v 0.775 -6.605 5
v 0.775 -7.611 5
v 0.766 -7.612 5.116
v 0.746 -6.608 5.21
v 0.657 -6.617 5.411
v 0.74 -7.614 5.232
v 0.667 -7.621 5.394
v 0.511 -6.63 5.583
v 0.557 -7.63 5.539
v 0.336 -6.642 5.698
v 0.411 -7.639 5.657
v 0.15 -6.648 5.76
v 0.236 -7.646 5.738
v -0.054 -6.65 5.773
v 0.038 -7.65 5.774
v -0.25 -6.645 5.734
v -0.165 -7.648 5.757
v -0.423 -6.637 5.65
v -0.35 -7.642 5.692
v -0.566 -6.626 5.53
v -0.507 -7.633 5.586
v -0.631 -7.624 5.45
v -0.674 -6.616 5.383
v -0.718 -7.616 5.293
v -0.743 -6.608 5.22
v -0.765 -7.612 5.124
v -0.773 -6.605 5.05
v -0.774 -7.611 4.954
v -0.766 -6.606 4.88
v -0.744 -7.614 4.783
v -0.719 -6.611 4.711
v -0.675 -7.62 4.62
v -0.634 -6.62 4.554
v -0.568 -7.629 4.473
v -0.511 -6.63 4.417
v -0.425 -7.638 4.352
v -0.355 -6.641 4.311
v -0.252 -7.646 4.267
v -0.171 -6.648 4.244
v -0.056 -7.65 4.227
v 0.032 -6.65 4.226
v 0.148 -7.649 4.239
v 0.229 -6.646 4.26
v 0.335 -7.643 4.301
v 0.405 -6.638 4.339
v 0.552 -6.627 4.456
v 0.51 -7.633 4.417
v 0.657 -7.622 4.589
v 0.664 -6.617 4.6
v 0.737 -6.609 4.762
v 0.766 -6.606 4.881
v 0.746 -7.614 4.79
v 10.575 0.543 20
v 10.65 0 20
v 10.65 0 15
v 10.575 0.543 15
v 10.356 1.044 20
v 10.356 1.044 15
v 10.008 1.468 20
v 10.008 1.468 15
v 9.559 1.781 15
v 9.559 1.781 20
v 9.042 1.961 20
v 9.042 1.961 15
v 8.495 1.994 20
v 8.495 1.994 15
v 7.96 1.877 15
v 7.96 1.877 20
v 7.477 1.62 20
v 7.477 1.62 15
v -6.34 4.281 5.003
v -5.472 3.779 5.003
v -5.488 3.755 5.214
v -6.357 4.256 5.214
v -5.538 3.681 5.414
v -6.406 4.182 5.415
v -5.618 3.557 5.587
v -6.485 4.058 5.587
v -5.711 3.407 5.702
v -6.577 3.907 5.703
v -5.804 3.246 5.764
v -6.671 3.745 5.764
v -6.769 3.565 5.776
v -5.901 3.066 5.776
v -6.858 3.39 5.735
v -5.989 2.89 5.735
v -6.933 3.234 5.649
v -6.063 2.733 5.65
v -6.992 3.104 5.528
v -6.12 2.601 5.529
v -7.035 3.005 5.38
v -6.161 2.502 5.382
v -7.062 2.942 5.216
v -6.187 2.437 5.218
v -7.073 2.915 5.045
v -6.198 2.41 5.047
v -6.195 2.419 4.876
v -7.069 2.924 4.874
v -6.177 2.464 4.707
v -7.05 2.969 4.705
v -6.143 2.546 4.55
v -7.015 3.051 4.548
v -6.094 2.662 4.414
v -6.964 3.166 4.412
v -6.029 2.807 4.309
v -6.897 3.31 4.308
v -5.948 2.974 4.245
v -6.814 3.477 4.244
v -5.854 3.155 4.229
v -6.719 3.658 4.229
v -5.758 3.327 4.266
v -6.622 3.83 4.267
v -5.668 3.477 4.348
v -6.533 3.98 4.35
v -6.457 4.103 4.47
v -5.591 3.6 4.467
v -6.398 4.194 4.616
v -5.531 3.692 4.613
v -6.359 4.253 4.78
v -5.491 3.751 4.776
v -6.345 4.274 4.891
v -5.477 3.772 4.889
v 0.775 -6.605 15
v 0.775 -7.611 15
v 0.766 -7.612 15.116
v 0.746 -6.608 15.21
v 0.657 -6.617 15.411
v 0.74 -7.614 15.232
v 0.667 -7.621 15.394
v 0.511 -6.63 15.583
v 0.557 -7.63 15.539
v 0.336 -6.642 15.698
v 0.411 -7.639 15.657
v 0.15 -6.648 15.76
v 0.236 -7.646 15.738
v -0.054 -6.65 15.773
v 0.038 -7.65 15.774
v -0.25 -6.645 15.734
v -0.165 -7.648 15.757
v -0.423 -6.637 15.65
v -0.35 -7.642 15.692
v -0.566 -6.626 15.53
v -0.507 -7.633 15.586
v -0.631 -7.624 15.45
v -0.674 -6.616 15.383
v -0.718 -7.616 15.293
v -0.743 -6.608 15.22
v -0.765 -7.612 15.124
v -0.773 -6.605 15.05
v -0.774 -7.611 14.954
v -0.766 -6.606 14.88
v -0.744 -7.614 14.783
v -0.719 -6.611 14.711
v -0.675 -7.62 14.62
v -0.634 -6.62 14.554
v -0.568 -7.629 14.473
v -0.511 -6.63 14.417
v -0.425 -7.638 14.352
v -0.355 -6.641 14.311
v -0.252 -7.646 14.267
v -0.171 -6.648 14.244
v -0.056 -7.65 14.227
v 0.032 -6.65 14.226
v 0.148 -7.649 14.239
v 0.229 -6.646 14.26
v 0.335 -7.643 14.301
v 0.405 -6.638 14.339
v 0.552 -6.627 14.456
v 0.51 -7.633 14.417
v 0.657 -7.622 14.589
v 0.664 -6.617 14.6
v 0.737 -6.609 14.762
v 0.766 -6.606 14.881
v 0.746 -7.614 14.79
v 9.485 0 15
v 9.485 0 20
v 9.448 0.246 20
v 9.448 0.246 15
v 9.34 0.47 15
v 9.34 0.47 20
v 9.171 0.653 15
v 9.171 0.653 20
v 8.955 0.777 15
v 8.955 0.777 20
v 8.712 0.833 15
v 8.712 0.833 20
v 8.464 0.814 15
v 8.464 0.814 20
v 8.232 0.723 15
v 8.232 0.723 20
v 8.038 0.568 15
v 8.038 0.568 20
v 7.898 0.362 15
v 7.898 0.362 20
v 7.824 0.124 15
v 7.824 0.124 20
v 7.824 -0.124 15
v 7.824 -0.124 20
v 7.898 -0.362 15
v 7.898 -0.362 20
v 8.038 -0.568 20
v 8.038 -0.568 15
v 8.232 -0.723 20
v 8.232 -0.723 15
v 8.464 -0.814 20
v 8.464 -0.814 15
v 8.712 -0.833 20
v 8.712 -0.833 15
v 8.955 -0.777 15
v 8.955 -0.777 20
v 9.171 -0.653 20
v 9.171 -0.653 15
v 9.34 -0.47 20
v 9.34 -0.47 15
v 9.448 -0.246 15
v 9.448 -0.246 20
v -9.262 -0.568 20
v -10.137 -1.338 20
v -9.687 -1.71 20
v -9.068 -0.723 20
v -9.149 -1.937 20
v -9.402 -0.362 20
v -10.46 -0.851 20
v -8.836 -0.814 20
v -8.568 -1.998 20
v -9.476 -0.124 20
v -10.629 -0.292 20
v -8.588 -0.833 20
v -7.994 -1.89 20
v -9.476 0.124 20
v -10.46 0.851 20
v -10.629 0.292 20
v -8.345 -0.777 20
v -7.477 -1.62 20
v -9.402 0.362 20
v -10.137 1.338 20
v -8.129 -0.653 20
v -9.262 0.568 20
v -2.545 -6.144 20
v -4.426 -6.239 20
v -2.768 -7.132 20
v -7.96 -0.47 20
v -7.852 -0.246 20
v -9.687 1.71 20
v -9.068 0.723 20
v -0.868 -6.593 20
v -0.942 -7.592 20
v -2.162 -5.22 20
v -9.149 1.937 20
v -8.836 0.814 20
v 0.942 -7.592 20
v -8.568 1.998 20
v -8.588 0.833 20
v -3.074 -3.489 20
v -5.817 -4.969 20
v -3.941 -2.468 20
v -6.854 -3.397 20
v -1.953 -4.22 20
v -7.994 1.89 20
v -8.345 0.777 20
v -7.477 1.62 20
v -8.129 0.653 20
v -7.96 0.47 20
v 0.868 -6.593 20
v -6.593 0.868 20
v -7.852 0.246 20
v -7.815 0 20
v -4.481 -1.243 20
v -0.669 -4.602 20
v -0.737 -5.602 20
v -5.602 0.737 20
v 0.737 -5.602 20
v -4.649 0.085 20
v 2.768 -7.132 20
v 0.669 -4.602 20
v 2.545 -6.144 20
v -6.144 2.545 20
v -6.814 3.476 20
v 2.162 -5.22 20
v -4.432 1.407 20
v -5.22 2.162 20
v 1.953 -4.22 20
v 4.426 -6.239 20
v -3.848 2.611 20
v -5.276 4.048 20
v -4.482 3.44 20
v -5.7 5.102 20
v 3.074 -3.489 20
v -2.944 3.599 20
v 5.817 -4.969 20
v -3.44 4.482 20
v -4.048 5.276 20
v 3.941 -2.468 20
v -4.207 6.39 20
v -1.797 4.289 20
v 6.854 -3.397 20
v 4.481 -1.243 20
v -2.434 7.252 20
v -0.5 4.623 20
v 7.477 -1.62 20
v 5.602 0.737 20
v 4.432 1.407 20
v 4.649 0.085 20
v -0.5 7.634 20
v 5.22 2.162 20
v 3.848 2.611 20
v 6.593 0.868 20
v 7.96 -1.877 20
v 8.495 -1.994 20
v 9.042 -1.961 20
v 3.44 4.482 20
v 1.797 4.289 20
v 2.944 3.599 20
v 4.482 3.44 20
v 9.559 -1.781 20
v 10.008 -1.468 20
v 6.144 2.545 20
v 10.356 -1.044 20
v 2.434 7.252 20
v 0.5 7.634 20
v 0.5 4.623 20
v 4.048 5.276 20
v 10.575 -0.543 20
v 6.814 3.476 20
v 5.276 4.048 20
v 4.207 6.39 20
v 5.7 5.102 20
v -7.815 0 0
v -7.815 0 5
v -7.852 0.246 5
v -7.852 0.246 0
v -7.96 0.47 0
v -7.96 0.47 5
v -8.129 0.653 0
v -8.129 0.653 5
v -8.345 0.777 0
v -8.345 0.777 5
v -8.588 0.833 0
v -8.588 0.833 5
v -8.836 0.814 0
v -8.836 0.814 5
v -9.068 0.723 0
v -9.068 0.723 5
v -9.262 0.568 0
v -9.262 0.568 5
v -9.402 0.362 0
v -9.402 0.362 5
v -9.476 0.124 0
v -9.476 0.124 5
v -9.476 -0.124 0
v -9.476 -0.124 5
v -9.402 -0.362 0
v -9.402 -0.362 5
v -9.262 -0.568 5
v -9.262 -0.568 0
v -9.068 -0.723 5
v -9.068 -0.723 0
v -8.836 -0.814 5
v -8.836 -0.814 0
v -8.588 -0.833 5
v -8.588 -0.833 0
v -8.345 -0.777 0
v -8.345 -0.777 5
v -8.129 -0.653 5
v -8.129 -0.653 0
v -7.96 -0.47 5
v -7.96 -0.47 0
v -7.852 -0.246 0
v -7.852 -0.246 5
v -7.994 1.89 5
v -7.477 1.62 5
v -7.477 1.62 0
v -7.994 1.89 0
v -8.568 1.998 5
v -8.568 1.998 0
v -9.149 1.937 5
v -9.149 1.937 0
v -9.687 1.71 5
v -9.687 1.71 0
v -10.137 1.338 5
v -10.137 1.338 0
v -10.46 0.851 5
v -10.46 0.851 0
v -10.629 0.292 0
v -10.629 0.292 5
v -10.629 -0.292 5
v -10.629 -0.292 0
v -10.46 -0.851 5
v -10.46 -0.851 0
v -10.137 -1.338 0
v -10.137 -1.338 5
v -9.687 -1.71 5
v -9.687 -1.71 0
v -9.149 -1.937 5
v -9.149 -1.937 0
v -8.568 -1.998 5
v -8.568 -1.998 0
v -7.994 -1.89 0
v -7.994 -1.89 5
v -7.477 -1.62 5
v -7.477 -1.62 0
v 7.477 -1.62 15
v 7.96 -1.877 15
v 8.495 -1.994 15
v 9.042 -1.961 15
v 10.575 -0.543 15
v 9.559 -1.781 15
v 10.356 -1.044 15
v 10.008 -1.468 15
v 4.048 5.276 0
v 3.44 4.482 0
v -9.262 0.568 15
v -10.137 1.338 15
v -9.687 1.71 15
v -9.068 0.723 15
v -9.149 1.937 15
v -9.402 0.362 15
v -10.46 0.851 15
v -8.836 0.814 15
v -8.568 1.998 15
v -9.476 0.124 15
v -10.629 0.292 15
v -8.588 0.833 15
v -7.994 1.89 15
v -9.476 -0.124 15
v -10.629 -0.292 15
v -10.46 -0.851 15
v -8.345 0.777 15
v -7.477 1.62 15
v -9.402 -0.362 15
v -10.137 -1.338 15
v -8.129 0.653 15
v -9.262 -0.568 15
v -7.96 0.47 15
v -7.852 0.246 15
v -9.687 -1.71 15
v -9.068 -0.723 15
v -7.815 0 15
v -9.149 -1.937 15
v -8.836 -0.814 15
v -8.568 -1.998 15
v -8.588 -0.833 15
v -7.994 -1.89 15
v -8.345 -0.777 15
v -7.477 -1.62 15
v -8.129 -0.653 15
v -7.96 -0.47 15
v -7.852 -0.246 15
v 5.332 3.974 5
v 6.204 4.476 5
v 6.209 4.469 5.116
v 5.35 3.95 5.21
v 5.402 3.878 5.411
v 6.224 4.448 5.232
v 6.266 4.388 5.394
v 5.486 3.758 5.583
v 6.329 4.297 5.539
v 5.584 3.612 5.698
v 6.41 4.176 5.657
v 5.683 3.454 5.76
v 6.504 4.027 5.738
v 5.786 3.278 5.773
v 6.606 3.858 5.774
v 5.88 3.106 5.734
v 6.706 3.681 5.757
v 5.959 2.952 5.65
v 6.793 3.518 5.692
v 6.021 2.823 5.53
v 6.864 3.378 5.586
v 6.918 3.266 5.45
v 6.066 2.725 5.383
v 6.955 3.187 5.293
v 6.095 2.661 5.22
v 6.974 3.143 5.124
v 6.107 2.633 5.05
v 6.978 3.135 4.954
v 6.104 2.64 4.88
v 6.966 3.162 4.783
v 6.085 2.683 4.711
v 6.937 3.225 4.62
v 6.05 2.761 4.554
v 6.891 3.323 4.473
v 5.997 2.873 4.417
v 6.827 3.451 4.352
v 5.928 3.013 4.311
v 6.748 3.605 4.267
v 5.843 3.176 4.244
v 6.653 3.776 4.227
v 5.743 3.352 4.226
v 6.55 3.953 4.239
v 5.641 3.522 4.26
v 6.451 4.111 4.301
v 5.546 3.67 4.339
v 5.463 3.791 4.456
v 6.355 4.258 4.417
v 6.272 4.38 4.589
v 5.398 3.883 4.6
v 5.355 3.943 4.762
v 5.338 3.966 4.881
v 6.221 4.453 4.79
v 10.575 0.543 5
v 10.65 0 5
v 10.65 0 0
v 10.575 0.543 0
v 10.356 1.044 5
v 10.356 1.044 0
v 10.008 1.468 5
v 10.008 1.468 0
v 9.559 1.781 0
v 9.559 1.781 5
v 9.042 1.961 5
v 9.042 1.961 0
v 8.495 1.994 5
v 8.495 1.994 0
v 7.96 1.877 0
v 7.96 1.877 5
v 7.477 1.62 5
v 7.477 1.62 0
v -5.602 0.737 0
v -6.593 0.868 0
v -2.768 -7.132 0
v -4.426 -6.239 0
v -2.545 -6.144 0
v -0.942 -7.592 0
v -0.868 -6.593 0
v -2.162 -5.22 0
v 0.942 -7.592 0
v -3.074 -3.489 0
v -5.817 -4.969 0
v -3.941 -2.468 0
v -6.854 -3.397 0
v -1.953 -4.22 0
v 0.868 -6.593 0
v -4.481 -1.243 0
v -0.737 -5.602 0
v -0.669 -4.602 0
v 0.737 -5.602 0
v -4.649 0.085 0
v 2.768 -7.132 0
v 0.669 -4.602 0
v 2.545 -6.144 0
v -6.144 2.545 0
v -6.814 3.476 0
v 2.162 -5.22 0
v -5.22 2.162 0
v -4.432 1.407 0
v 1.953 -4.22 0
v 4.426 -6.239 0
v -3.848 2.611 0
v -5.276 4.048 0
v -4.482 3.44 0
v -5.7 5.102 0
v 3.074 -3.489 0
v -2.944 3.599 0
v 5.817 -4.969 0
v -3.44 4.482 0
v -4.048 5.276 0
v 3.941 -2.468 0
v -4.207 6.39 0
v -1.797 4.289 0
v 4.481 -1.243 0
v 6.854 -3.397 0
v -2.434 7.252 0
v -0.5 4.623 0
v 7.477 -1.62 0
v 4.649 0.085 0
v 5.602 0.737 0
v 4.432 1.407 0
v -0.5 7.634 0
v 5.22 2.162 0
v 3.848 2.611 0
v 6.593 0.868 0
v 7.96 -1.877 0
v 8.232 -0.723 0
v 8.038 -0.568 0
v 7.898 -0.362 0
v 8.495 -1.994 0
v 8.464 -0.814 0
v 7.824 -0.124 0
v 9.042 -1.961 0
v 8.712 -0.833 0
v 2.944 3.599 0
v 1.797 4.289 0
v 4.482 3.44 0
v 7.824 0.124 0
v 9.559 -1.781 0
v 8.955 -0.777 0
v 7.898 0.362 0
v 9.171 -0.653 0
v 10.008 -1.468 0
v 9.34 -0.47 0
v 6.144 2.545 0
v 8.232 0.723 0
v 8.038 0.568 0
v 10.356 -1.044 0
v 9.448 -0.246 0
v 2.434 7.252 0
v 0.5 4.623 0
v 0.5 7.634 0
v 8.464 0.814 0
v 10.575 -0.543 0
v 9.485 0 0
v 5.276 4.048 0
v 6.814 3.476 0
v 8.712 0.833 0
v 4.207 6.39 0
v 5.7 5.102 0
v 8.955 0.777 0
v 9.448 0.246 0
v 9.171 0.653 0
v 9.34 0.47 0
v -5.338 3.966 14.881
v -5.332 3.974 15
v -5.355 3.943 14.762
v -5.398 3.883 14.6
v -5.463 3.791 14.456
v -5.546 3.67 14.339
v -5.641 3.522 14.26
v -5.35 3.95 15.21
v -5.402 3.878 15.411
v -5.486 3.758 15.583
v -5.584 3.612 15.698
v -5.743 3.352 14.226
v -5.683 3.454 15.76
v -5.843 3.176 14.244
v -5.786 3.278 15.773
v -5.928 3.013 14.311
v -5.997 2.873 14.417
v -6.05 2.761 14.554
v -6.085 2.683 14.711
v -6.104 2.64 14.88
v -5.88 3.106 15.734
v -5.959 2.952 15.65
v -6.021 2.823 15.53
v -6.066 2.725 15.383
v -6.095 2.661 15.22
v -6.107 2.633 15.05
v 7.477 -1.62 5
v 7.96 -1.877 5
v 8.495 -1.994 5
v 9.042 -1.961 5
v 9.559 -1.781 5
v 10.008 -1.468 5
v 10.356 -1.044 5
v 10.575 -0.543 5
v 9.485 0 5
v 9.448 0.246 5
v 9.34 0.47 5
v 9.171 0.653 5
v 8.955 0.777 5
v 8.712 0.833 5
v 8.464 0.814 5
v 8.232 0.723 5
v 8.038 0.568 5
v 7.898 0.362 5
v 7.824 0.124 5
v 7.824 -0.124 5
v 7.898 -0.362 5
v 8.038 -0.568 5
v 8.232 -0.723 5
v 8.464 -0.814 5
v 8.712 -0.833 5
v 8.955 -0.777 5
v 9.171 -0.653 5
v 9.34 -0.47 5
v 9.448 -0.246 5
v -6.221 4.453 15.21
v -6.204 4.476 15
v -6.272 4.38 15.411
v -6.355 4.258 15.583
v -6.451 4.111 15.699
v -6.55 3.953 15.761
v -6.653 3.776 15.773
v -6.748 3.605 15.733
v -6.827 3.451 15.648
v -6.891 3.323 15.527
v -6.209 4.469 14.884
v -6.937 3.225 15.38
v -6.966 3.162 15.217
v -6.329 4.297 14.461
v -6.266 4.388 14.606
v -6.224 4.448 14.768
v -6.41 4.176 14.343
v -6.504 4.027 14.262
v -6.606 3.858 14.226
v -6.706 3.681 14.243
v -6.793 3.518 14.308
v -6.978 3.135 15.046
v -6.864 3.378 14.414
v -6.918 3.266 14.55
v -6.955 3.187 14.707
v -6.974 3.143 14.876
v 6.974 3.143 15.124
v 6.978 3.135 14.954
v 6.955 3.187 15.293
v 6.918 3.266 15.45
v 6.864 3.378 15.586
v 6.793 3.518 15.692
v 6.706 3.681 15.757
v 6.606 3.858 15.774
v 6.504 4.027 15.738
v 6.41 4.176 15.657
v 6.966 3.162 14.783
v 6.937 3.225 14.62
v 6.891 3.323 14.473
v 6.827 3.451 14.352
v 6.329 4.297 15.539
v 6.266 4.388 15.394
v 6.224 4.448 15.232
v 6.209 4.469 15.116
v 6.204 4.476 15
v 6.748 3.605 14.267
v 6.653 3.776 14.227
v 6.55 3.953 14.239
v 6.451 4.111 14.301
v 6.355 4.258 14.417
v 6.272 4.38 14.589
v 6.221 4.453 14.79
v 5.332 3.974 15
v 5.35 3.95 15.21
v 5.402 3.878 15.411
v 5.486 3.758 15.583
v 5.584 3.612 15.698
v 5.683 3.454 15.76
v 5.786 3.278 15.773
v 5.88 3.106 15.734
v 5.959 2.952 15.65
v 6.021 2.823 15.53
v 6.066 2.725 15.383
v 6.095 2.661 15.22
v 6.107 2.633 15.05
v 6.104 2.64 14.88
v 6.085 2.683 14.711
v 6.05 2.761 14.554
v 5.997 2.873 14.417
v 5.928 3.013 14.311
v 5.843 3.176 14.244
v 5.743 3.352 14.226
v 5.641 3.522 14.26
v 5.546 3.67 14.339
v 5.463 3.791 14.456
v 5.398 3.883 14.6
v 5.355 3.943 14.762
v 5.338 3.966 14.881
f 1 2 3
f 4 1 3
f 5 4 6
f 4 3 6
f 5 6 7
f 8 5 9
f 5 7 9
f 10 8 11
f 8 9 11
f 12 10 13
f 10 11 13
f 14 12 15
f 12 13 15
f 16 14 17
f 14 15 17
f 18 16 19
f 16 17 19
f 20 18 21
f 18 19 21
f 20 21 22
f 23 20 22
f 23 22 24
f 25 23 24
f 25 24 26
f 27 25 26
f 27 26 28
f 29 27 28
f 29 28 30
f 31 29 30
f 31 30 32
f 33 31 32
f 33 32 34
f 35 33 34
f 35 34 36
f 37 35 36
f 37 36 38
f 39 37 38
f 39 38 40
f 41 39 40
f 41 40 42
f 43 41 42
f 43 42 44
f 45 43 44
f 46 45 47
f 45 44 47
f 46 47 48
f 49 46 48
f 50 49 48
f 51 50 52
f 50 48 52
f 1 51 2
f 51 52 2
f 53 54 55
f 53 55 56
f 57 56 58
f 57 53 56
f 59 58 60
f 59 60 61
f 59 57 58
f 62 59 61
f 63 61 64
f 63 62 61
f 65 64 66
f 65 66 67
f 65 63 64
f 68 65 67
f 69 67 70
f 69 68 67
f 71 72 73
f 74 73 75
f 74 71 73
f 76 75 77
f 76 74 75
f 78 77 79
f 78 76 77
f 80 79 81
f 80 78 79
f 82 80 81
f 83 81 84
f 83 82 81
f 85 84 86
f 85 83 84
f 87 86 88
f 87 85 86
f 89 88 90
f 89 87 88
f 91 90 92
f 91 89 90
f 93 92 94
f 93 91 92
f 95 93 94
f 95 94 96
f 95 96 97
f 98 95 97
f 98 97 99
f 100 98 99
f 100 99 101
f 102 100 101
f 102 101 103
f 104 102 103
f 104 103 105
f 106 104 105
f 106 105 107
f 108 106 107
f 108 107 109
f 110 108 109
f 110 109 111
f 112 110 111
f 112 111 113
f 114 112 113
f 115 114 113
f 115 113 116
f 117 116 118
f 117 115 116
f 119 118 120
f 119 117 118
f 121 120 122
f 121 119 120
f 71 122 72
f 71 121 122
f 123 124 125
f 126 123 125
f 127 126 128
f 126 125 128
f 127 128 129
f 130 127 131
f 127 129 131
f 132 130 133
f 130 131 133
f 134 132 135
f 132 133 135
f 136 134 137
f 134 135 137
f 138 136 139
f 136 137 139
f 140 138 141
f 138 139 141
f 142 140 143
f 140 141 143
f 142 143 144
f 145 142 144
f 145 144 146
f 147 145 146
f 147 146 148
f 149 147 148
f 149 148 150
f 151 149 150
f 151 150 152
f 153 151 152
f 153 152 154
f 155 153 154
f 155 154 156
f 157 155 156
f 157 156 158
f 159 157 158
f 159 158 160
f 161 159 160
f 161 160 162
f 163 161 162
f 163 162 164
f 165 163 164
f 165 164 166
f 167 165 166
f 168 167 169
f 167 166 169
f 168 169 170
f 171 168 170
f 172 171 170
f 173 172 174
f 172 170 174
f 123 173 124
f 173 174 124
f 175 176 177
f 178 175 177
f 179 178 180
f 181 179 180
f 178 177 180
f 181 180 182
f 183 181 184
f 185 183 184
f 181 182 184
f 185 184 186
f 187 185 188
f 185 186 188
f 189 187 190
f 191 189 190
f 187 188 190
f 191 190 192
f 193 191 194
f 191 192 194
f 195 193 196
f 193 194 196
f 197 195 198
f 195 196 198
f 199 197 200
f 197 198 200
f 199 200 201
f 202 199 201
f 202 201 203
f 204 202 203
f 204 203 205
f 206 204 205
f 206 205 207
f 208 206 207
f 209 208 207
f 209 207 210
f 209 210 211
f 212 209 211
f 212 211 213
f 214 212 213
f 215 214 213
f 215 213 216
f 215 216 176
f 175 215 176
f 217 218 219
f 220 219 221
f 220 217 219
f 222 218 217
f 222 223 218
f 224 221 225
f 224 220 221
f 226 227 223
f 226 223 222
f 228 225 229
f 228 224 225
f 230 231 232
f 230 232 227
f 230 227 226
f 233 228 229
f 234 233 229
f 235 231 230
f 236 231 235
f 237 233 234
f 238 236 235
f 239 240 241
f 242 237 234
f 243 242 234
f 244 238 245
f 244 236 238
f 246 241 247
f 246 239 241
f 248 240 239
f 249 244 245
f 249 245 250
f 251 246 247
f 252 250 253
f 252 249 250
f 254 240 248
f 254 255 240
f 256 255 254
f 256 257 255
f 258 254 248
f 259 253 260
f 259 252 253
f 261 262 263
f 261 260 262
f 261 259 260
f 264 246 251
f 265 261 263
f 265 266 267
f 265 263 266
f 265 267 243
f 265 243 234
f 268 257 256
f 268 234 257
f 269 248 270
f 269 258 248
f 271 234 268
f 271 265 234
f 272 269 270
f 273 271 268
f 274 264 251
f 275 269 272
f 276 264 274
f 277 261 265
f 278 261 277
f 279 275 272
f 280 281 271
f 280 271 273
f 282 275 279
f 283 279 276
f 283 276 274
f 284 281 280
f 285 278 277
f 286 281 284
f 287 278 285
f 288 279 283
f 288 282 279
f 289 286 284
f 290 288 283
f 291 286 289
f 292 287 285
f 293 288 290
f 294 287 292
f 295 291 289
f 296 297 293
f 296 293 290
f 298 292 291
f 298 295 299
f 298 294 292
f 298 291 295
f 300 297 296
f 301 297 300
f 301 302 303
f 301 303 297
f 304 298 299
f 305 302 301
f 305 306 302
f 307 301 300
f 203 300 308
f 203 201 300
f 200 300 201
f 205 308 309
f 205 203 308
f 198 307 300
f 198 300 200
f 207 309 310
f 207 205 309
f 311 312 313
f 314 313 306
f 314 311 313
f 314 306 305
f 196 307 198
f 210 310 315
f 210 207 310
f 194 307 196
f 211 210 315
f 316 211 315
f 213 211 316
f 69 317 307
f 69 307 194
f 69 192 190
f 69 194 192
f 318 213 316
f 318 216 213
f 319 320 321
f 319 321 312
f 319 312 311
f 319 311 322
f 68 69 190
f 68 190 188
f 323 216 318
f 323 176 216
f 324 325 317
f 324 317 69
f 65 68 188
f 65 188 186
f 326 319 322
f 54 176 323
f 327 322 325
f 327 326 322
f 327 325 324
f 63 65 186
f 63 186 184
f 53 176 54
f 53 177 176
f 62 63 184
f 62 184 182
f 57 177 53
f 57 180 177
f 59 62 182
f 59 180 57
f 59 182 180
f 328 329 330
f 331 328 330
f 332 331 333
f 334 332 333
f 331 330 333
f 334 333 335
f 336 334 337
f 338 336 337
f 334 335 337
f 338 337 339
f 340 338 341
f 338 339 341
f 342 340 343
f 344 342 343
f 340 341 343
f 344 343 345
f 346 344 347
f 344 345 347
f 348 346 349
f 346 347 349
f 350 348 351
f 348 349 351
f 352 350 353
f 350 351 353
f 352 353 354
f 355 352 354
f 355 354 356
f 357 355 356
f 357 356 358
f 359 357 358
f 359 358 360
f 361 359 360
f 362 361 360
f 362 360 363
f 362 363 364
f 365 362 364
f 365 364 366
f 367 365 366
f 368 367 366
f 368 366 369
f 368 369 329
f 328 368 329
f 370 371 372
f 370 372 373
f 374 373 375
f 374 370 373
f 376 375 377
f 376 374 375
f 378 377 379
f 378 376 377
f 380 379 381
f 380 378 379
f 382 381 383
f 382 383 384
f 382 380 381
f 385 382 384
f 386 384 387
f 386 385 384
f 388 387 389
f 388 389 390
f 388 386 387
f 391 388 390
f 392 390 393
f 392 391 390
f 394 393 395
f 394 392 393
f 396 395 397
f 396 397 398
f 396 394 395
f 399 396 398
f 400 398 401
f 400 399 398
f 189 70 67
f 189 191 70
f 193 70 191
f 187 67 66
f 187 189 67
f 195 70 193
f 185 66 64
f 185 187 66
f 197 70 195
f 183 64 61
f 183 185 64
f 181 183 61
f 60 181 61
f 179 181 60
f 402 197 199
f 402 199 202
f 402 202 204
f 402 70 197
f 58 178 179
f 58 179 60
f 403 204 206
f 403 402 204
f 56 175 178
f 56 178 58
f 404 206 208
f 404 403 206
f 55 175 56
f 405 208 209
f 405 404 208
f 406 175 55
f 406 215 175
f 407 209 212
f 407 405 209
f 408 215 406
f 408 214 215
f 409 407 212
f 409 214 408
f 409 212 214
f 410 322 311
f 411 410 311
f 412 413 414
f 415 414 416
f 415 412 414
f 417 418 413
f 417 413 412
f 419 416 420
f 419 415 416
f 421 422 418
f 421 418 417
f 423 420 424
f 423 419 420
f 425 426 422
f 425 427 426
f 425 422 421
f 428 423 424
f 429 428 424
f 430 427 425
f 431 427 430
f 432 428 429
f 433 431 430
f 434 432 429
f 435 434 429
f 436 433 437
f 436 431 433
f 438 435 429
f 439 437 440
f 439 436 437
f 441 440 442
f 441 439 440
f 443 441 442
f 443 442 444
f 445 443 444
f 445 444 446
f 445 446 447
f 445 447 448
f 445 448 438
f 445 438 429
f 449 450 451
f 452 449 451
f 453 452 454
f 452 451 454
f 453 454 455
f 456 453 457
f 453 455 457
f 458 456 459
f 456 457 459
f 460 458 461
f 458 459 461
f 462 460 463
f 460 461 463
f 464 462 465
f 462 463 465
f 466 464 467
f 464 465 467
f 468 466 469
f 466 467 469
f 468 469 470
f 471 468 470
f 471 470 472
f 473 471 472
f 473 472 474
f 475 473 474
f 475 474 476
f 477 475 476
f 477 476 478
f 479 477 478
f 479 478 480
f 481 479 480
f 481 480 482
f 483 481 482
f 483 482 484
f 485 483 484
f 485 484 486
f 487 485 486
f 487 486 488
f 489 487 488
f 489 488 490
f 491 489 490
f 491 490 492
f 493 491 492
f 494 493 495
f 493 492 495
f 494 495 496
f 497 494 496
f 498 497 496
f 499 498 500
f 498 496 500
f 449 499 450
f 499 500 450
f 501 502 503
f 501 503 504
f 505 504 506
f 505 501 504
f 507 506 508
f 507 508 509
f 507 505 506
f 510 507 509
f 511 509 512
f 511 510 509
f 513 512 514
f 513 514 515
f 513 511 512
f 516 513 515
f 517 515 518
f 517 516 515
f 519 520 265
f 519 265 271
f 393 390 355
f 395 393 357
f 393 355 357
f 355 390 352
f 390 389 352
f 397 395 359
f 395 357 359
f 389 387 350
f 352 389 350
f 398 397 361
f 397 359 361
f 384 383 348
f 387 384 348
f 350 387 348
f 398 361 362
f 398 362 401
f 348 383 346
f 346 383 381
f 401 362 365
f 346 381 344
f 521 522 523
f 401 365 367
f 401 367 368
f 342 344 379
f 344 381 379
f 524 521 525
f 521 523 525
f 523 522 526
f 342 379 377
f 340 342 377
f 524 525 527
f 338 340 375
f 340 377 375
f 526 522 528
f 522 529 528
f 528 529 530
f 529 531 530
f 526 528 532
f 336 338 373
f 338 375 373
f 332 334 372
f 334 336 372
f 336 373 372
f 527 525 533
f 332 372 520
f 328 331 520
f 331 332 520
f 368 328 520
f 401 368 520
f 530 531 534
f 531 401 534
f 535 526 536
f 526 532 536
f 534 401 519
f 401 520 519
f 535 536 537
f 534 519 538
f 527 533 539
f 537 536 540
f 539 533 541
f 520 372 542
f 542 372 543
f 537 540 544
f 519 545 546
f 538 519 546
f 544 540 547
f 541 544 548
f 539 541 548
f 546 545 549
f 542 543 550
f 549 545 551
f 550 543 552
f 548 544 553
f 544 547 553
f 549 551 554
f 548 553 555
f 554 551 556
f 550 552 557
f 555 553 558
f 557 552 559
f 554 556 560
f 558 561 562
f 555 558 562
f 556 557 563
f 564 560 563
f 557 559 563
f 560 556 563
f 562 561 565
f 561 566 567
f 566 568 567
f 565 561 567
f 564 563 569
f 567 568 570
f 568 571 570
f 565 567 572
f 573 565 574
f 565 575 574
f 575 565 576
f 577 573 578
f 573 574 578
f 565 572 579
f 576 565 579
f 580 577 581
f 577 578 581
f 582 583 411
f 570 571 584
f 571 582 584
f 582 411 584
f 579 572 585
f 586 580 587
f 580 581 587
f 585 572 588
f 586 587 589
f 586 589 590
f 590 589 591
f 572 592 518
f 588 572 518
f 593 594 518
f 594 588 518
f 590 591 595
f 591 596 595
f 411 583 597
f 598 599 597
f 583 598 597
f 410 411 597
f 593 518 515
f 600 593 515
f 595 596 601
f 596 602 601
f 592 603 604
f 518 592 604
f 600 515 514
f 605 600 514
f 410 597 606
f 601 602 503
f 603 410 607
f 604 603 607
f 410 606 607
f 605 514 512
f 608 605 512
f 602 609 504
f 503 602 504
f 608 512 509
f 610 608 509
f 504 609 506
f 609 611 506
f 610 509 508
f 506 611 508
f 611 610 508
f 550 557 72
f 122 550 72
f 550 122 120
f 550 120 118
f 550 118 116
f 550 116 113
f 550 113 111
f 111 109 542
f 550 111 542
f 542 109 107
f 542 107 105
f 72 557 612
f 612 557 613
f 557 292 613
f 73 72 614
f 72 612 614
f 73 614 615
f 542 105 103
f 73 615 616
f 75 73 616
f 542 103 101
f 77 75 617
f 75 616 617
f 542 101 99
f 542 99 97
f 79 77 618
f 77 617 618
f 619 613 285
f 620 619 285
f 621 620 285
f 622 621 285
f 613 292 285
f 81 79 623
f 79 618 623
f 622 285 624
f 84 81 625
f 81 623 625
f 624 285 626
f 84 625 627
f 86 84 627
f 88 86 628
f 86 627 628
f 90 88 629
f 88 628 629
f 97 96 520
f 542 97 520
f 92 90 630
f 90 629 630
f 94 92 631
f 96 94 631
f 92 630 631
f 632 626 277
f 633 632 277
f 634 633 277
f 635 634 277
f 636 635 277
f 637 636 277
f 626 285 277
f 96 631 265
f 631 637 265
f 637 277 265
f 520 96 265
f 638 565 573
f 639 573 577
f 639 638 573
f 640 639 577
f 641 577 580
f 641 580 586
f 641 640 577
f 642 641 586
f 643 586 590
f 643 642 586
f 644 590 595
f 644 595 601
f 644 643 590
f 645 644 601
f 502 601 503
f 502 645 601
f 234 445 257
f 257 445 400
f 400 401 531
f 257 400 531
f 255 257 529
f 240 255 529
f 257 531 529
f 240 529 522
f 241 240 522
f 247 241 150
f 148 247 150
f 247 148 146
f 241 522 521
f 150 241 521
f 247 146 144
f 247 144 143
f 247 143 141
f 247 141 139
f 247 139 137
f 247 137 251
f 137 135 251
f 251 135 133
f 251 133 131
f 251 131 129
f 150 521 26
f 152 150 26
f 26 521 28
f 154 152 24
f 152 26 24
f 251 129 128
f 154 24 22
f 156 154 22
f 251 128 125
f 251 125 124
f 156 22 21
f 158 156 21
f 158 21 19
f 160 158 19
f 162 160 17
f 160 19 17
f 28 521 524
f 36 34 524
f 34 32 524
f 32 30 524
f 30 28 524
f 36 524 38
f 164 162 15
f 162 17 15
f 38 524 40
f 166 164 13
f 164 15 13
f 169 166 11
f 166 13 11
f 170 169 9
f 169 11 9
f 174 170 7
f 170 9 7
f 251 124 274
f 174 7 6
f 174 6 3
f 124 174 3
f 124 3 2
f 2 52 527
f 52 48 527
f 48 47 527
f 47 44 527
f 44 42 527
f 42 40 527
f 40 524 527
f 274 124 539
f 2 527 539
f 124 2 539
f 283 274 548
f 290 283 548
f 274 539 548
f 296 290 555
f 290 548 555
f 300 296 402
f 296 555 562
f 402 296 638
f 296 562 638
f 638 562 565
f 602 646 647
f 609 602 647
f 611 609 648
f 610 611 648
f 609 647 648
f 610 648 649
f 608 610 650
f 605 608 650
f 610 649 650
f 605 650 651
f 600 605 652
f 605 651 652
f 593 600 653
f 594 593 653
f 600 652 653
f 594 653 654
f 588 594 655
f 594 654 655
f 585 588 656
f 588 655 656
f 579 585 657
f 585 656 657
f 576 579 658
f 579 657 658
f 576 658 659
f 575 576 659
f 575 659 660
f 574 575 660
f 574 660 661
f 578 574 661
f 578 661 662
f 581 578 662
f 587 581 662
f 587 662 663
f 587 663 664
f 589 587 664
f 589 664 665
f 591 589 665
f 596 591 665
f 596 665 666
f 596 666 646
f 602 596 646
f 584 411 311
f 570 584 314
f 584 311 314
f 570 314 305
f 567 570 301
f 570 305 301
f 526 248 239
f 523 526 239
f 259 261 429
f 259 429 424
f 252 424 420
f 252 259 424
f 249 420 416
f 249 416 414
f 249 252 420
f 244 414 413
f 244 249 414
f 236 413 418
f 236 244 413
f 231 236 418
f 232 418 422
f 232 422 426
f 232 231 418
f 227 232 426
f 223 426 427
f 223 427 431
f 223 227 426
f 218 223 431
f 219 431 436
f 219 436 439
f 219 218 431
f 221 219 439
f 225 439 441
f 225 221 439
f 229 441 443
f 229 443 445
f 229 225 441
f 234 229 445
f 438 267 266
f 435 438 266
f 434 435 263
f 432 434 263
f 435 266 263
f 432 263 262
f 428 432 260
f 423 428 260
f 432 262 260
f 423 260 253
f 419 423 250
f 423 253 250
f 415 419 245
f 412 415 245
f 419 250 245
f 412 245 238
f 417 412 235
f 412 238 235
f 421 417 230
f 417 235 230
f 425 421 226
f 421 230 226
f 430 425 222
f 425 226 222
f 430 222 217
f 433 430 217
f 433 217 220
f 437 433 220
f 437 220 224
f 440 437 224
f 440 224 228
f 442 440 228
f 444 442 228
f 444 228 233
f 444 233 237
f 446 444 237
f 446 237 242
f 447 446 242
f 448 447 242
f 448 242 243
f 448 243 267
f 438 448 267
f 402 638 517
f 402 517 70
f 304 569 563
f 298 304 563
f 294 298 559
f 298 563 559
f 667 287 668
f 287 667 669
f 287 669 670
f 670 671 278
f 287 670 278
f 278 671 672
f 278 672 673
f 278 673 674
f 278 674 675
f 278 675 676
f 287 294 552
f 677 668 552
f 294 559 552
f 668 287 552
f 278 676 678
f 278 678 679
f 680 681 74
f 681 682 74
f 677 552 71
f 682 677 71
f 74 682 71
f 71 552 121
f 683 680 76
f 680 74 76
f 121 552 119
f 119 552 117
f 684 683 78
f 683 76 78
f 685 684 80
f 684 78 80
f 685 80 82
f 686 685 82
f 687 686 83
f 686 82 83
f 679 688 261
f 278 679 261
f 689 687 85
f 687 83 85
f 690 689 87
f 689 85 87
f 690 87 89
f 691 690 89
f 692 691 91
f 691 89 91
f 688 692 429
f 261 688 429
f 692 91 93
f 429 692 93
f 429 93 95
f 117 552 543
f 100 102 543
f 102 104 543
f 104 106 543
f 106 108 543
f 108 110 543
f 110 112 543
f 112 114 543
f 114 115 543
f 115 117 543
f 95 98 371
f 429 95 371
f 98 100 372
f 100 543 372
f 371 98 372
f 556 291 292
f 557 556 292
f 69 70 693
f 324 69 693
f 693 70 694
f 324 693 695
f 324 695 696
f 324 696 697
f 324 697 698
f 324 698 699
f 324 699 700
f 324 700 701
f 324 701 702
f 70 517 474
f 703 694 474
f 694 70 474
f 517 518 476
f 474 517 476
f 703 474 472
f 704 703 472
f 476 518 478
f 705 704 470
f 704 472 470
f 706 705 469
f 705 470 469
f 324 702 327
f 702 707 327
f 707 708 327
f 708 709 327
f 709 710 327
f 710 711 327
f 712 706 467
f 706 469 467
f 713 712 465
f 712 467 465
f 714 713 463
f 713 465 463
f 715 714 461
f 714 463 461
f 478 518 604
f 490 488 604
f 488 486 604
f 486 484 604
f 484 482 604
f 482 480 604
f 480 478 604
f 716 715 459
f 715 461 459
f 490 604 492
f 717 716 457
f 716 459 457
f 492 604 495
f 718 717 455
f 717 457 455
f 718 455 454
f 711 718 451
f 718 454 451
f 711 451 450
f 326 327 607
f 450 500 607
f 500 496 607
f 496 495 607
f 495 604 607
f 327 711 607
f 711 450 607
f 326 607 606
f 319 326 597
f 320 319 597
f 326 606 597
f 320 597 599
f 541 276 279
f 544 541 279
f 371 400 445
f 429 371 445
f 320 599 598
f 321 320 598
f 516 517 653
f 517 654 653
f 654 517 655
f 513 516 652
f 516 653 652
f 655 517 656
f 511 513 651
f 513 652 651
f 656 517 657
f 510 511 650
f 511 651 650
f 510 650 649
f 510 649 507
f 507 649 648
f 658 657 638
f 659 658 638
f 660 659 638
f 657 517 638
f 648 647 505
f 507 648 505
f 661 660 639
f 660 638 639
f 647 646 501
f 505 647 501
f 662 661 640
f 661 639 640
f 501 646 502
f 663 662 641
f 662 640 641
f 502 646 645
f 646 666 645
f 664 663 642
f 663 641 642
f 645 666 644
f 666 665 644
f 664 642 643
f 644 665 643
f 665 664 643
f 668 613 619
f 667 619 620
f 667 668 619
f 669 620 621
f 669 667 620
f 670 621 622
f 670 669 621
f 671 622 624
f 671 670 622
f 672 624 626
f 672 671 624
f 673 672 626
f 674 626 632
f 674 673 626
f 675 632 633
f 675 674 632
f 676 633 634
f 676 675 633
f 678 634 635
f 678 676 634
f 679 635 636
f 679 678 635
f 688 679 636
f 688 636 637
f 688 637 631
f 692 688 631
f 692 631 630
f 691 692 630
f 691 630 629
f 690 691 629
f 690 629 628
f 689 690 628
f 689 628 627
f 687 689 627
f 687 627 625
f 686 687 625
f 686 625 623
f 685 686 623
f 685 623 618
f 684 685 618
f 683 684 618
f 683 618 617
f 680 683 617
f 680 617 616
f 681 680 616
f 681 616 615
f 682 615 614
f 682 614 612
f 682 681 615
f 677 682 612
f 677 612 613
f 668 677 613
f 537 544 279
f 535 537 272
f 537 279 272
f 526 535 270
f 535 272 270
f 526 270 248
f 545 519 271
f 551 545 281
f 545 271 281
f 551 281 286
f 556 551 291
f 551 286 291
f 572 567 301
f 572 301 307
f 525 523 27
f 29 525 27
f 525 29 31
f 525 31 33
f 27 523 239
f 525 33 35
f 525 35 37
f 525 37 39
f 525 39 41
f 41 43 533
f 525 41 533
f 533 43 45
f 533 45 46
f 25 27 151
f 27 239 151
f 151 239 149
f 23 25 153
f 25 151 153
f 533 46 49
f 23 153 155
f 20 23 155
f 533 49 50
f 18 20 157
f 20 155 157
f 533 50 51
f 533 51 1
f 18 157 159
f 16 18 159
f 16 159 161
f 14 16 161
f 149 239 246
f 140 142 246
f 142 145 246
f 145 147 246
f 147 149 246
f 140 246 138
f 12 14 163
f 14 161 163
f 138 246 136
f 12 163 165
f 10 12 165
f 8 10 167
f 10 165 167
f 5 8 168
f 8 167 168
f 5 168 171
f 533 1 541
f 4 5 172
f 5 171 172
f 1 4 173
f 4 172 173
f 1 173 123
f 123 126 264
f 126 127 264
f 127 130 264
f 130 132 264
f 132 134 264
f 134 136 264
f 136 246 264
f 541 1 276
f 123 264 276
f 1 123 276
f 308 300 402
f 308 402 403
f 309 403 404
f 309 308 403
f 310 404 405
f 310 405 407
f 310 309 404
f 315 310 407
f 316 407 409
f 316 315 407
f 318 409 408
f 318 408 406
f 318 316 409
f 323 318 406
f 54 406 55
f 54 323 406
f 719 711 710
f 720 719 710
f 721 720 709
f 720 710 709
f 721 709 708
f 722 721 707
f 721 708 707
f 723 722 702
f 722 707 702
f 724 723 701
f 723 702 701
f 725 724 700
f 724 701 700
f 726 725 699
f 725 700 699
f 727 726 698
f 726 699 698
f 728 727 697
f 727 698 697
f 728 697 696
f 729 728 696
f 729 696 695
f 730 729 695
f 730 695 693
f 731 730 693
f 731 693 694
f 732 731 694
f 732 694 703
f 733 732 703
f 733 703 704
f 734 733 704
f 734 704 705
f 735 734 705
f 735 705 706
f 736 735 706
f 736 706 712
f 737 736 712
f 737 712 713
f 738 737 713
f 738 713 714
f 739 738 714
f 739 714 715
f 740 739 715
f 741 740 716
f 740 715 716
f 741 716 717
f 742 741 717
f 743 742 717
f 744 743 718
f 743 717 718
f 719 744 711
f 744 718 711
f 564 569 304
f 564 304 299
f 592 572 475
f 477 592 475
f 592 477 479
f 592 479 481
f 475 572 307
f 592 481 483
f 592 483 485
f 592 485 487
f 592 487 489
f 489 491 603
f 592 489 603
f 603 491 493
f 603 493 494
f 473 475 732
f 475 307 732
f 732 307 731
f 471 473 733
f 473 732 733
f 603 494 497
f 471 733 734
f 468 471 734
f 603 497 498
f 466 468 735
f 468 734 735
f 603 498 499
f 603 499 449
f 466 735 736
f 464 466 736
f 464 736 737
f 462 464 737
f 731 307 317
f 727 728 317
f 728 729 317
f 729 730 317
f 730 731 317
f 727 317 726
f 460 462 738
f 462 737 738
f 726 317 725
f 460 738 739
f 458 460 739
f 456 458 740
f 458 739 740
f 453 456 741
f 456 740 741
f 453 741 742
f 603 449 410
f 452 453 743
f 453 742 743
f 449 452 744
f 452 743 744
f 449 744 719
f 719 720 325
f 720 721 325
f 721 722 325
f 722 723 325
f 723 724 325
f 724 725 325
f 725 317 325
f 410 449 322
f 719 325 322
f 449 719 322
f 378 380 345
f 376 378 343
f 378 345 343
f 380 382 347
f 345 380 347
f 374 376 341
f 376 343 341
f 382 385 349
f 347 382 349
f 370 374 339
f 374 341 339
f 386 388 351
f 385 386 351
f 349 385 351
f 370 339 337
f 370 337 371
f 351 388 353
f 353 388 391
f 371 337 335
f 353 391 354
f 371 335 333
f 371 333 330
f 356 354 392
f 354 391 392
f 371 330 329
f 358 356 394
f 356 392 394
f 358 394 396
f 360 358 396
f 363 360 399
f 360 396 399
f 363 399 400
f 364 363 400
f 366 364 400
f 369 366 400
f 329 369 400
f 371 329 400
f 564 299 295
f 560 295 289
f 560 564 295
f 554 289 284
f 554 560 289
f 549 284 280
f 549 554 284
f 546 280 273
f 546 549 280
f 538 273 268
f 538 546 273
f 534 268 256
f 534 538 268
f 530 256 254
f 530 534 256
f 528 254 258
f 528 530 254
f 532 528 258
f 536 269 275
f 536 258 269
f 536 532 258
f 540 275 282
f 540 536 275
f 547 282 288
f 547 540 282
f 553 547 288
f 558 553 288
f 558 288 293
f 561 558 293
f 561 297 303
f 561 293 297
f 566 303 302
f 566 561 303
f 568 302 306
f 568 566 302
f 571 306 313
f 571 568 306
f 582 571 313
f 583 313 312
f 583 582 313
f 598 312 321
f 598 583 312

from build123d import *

# Parameters (mm, degrees)
F0_R      = 7.65
F0_R_2    = 4.65
F1_DEPTH  = 20
F4_DEPTH  = 20.001
F6_R      = 0.775
F7_DEPTH  = 1.0786128078
F9_R      = 0.775
F10_DEPTH = 1.0463142634
F12_R     = 0.775
F13_DEPTH = 1.0463142634
F14_W     = 1
F14_H     = 5.2947397344
F15_DEPTH = 20
F16_R     = 0.835
F17_DEPTH = 20
F18_W     = 3.1734104046
F18_H     = 10
F19_DEPTH = 15.2846427429


with BuildPart() as f1:
    # F0 (on Top) → F1 (new body)
    with BuildSketch(Plane.XY):
        Circle(F0_R)
        Circle(F0_R_2, mode=Mode.SUBTRACT)
    extrude(amount=F1_DEPTH)

    # F2 (on face) → F4 (cut, through all)
    with BuildSketch(Plane.XY.offset(20)):
        with BuildLine():
            Line((-3.4395020739, 4.4824463726), (-4.0482635029, 5.2757997129))
            ThreePointArc((-4.0482635029, 5.2757997129), (-5.7590689352, 3.325), (-6.5931083281, 0.8679991783))
            Line((-6.5931083281, 0.8679991783), (-5.6016634668, 0.737472986))
            ThreePointArc((-5.6016634668, 0.737472986), (-4.8930435314, 2.825), (-3.4395020739, 4.4824463726))
        make_face()
        with BuildLine():
            Line((4.0482635029, 5.2757997129), (3.4395020739, 4.4824463726))
            ThreePointArc((3.4395020739, 4.4824463726), (4.8930435314, 2.825), (5.6016634668, 0.737472986))
            Line((5.6016634668, 0.737472986), (6.5931083281, 0.8679991783))
            ThreePointArc((6.5931083281, 0.8679991783), (5.7590689352, 3.325), (4.0482635029, 5.2757997129))
        make_face()
        with BuildLine():
            ThreePointArc((2.1621613929, -5.2199193587), (0, -5.65), (-2.1621613929, -5.2199193587))
            Line((-2.1621613929, -5.2199193587), (-2.5448448252, -6.1437988912))
            ThreePointArc((-2.5448448252, -6.1437988912), (0, -6.65), (2.5448448252, -6.1437988912))
            Line((2.5448448252, -6.1437988912), (2.1621613929, -5.2199193587))
        make_face()
    extrude(amount=-F4_DEPTH, mode=Mode.SUBTRACT)

    # F6 (on line) → F7 (cut, through all)
    with BuildSketch(Plane(origin=(-6.625094339, 3.825, 0), x_dir=(0.5, 0.8660254038, 0), z_dir=(0.8660254038, -0.5, 0))):
        with Locations((0, 15)):
            Circle(F6_R)
        with Locations((-0.2380277795, 5.0028332626)):
            Circle(F6_R)
    extrude(amount=F7_DEPTH, mode=Mode.SUBTRACT)

    # F9 (on line) → F10 (cut, through all)
    with BuildSketch(Plane.XZ.offset(7.65)):
        with Locations((0, 5)):
            Circle(F9_R)
        with Locations((0, 15)):
            Circle(F9_R)
    extrude(amount=-F10_DEPTH, mode=Mode.SUBTRACT)

    # F12 (on line) → F13 (cut, through all)
    with BuildSketch(Plane(origin=(6.625094339, 3.825, 0), x_dir=(-0.5, 0.8660254038, 0), z_dir=(0.8660254038, 0.5, 0))):
        with Locations((0, 5)):
            Circle(F12_R)
        with Locations((0, 15)):
            Circle(F12_R)
    extrude(amount=-F13_DEPTH, mode=Mode.SUBTRACT)

    # F14 (on face) → F15 (cut, through all)
    with BuildSketch(Plane(origin=(0, 0, 0), x_dir=(1, 0, 0), z_dir=(0, 0, -1))):
        with Locations((0, -6.6740161274)):
            Rectangle(F14_W, F14_H)
    extrude(amount=-F15_DEPTH, mode=Mode.SUBTRACT)

    # F16 (on face) → F17 (join, through all)
    with BuildSketch(Plane.XY.offset(20)):
        with BuildLine():
            ThreePointArc((-7.4765895954, -1.6196011924), (-7.65, 0), (-7.4765895954, 1.6196011924))
            ThreePointArc((-7.4765895954, 1.6196011924), (-10.65, 0), (-7.4765895954, -1.6196011924))
        make_face()
        with Locations((-8.65, 0)):
            Circle(F16_R, mode=Mode.SUBTRACT)
        with BuildLine():
            ThreePointArc((7.4765895954, -1.6196011924), (9.5591697286, -1.7814068611), (10.65, 0))
            ThreePointArc((10.65, 0), (9.5591697286, 1.7814068611), (7.4765895954, 1.6196011924))
            ThreePointArc((7.4765895954, 1.6196011924), (7.606523858, 0.8144291238), (7.65, 0))
            ThreePointArc((7.65, 0), (7.606523858, -0.8144291238), (7.4765895954, -1.6196011924))
        make_face()
        with Locations((8.65, 0)):
            Circle(F16_R, mode=Mode.SUBTRACT)
    extrude(amount=-F17_DEPTH)

    # F18 (on line) → F19 (cut, through all)
    with BuildSketch(Plane.XZ.offset(7.65)):
        with Locations((-9.0632947977, 10)):
            Rectangle(F18_W, F18_H)
        with Locations((9.0632947977, 10)):
            Rectangle(F18_W, F18_H)
    extrude(amount=-F19_DEPTH, mode=Mode.SUBTRACT)


solid = f1.part
